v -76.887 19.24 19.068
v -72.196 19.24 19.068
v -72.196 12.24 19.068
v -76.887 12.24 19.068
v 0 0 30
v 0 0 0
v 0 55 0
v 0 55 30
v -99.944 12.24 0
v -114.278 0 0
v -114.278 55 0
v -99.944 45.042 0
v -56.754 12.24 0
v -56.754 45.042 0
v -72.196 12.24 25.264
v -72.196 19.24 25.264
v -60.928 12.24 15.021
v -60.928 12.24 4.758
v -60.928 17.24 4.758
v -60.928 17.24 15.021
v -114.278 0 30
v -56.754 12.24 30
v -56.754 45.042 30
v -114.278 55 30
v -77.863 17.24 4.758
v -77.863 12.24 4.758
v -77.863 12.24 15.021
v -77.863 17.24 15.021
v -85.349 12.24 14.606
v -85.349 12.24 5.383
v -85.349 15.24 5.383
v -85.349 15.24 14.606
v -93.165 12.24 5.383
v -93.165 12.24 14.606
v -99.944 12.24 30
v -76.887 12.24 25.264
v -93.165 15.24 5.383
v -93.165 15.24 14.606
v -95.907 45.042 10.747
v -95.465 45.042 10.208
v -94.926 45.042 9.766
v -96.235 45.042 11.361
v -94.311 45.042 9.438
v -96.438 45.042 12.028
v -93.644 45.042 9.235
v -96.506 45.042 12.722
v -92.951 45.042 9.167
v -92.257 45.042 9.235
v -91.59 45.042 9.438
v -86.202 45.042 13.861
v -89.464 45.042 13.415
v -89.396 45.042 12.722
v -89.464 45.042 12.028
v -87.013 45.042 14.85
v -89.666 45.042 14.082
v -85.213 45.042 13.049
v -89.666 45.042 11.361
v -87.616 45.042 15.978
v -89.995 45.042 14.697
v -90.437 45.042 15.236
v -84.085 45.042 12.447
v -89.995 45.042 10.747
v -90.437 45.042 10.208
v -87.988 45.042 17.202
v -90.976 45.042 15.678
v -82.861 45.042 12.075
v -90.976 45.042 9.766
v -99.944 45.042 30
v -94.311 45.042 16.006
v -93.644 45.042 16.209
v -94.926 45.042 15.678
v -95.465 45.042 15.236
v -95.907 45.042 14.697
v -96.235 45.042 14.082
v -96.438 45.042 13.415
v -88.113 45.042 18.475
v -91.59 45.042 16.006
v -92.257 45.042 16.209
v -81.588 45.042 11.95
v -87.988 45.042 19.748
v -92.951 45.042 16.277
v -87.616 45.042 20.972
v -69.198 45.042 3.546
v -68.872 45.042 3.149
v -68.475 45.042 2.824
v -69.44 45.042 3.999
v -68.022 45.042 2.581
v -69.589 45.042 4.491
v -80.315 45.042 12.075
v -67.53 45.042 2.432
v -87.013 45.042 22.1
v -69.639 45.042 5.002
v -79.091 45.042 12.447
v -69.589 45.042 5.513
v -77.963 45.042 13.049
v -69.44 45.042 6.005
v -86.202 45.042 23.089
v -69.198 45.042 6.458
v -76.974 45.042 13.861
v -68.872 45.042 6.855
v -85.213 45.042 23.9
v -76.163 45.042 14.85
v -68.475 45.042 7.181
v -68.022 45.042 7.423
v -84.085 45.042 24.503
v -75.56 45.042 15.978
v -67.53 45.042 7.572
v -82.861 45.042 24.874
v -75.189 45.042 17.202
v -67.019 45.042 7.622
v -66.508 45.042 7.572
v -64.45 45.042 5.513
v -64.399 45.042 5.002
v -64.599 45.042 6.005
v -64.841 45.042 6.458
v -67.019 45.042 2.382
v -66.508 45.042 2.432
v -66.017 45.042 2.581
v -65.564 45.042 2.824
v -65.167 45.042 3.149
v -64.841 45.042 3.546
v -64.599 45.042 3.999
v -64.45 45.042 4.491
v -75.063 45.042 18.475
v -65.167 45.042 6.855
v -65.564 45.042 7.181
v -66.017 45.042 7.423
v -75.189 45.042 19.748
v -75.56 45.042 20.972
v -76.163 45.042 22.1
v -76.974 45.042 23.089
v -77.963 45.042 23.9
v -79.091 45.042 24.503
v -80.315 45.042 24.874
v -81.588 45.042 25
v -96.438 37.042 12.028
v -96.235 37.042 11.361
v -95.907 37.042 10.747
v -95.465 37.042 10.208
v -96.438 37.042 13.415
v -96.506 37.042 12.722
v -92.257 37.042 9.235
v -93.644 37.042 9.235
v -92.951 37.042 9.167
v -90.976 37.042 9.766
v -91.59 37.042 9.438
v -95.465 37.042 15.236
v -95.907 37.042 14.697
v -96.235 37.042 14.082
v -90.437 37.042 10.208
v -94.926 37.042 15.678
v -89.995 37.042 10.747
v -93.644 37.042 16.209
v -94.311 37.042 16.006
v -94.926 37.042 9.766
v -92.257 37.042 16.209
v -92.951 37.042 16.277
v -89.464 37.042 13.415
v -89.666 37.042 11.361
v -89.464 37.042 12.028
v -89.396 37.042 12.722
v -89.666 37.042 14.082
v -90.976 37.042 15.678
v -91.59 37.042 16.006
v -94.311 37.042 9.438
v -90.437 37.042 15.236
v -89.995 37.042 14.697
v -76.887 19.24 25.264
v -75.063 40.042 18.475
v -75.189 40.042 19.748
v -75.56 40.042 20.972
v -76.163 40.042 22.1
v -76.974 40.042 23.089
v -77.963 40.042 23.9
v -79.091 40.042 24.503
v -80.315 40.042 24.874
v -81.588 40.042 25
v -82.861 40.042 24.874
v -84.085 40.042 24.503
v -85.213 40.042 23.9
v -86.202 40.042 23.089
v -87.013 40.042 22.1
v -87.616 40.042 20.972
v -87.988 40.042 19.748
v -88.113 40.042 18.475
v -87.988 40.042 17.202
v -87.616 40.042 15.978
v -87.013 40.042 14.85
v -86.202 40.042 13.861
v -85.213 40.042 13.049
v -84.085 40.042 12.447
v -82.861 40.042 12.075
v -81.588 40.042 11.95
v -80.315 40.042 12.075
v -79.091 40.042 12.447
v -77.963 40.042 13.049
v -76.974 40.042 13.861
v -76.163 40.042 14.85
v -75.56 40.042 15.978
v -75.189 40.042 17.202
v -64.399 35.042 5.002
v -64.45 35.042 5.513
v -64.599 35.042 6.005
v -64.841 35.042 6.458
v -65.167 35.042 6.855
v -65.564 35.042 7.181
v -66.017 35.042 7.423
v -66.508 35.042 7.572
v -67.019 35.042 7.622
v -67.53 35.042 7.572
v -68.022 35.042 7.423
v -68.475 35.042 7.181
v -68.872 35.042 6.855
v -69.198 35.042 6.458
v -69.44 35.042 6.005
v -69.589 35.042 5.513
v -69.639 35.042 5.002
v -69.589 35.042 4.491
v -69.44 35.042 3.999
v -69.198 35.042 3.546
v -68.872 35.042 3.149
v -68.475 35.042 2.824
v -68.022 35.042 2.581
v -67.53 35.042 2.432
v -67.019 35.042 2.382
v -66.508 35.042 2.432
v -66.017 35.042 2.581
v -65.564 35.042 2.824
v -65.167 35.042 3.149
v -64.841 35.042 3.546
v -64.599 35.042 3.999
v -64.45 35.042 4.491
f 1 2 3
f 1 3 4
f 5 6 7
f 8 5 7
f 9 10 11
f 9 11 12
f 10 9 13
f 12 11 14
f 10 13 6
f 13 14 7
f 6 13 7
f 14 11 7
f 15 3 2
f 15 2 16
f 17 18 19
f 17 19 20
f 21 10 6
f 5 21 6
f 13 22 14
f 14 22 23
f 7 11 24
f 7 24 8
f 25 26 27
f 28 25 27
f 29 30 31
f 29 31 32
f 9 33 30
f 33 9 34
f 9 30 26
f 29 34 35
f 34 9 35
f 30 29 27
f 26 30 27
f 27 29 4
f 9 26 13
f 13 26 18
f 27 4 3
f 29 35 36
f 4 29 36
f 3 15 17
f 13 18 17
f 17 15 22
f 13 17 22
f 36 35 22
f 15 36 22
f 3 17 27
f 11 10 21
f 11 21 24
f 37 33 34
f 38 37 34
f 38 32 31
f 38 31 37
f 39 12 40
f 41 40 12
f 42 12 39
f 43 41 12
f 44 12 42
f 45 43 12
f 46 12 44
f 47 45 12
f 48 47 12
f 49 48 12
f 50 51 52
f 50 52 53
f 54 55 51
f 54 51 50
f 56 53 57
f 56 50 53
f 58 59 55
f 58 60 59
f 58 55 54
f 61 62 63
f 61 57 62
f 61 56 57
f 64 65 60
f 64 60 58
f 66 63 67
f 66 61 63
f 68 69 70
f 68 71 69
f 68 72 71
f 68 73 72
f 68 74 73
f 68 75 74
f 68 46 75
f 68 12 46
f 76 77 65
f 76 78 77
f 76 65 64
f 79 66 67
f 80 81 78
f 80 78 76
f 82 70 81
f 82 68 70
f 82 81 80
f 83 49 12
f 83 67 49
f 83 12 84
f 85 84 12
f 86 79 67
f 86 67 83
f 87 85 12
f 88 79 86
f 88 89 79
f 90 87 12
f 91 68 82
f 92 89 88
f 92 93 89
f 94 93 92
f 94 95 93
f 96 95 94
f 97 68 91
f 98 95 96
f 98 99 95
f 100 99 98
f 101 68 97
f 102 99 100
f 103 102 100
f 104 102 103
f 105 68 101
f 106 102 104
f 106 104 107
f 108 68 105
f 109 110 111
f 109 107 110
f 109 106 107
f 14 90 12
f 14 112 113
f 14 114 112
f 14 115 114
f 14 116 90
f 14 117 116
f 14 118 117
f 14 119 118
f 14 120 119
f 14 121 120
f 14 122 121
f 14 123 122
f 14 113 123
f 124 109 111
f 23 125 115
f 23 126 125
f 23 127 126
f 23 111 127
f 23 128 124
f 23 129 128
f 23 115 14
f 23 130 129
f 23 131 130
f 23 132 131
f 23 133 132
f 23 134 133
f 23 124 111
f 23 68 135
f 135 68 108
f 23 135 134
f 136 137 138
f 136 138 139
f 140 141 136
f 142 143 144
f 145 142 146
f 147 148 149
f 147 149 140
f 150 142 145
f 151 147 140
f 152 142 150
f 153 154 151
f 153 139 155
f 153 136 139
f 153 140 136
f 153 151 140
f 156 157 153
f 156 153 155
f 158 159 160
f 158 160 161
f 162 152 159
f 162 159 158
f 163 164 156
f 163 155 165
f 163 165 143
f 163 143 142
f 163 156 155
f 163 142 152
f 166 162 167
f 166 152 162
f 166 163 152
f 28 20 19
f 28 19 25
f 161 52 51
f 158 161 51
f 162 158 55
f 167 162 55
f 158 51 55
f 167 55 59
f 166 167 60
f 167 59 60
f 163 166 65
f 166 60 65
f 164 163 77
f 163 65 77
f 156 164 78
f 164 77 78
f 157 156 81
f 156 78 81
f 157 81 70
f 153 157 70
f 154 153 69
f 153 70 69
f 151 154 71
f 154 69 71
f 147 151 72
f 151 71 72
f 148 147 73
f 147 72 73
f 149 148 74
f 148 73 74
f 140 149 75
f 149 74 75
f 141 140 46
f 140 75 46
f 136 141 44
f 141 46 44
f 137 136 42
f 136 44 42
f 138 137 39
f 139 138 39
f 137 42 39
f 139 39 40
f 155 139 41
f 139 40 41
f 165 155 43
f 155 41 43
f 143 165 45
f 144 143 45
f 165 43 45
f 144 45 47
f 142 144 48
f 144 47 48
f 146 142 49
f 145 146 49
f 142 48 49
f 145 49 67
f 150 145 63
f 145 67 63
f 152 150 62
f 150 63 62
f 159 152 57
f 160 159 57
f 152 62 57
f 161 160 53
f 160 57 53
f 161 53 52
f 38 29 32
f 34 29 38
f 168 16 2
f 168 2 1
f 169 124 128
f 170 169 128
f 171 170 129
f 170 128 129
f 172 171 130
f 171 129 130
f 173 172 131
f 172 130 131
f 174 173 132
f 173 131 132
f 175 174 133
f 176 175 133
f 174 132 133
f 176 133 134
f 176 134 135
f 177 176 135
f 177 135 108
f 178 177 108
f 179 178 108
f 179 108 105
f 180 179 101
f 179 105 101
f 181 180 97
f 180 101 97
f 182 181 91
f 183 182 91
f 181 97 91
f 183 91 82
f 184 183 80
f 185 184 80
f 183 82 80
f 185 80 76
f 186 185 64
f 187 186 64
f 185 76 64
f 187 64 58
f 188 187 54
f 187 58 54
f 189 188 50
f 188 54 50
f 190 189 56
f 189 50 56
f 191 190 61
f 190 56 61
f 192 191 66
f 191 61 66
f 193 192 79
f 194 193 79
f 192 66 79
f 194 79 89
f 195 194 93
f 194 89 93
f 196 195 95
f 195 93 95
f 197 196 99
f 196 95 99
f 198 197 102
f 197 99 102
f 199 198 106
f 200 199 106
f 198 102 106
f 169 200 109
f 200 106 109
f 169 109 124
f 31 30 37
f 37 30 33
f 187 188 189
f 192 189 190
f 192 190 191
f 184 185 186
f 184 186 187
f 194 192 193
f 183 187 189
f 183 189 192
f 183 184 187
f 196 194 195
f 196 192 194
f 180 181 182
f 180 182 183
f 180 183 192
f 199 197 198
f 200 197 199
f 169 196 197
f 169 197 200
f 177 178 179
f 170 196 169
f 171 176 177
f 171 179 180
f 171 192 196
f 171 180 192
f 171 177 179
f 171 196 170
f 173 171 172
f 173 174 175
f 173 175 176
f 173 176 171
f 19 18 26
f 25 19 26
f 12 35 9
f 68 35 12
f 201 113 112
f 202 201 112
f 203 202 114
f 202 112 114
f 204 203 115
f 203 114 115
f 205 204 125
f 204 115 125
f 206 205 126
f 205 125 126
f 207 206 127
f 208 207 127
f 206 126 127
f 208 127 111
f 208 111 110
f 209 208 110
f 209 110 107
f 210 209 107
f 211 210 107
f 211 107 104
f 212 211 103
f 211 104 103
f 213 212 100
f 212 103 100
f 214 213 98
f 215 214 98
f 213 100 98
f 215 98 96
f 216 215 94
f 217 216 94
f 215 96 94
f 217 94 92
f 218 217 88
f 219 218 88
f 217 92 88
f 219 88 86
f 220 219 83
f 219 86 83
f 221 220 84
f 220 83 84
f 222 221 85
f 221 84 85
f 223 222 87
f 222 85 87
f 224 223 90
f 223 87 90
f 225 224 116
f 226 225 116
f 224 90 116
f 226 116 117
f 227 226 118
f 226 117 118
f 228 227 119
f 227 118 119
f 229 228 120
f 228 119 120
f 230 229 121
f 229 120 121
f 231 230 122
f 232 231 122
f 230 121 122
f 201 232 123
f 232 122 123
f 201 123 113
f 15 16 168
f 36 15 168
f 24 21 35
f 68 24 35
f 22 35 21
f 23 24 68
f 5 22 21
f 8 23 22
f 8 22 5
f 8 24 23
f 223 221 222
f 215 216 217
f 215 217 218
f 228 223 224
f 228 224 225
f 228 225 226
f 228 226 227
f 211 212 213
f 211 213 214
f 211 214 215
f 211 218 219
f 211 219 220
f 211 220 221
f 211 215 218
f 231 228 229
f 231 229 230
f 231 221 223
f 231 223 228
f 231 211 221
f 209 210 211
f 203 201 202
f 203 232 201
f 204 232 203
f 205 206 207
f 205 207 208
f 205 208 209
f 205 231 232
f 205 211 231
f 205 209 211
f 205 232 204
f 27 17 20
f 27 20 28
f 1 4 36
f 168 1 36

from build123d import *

# Parameters (mm, degrees)
F0_W      = 114.278237
F0_H      = 55
F1_DEPTH  = 30
F2_W      = 43.190174
F2_H      = 32.801846
F3_DEPTH  = 30.001
F4_W      = 7.815801
F4_H      = 9.223189
F5_DEPTH  = 3
F6_W      = 4.690871
F6_H      = 6.195421
F7_DEPTH  = 7
F8_W      = 16.93508
F8_H      = 10.262838
F9_DEPTH  = 5
F10_R     = 3.555014
F11_DEPTH = 8
F12_R     = 6.524901
F13_DEPTH = 5
F14_R     = 2.620041
F15_DEPTH = 10


with BuildPart() as f1:
    # F0 (on Top) → F1 (new body)
    with BuildSketch(Plane.XY):
        with Locations((-57.139118, 27.5)):
            Rectangle(F0_W, F0_H)
    extrude(amount=F1_DEPTH)

    # F2 (on face) → F3 (cut, through all)
    with BuildSketch(Plane.XY.offset(30)):
        with Locations((-78.348886, 28.64116)):
            Rectangle(F2_W, F2_H)
    extrude(amount=-F3_DEPTH, mode=Mode.SUBTRACT)

    # F4 (on face) → F5 (join)
    with BuildSketch(Plane(origin=(0, 12.240237, 0), x_dir=(-1, 0, 0), z_dir=(0, 1, 0))):
        with Locations((89.257304, 9.994802)):
            Rectangle(F4_W, F4_H)
    extrude(amount=F5_DEPTH)

    # F6 (on face) → F7 (join)
    with BuildSketch(Plane(origin=(0, 12.240237, 0), x_dir=(-1, 0, 0), z_dir=(0, 1, 0))):
        with Locations((74.541517, 22.166014)):
            Rectangle(F6_W, F6_H)
    extrude(amount=F7_DEPTH)

    # F8 (on face) → F9 (join)
    with BuildSketch(Plane(origin=(0, 12.240237, 0), x_dir=(-1, 0, 0), z_dir=(0, 1, 0))):
        with Locations((69.395147, 9.889492)):
            Rectangle(F8_W, F8_H)
    extrude(amount=F9_DEPTH)

    # F10 (on face) → F11 (join)
    with BuildSketch(Plane.XZ.offset(-45.042083)):
        with Locations((-92.950813, 12.721915)):
            Circle(F10_R)
    extrude(amount=F11_DEPTH)

    # F12 (on face) → F13 (join)
    with BuildSketch(Plane.XZ.offset(-45.042083)):
        with Locations((-81.588104, 18.474752)):
            Circle(F12_R)
    extrude(amount=F13_DEPTH)

    # F14 (on face) → F15 (join)
    with BuildSketch(Plane.XZ.offset(-45.042083)):
        with Locations((-67.019306, 5.002084)):
            Circle(F14_R)
    extrude(amount=F15_DEPTH)


solid = f1.part
